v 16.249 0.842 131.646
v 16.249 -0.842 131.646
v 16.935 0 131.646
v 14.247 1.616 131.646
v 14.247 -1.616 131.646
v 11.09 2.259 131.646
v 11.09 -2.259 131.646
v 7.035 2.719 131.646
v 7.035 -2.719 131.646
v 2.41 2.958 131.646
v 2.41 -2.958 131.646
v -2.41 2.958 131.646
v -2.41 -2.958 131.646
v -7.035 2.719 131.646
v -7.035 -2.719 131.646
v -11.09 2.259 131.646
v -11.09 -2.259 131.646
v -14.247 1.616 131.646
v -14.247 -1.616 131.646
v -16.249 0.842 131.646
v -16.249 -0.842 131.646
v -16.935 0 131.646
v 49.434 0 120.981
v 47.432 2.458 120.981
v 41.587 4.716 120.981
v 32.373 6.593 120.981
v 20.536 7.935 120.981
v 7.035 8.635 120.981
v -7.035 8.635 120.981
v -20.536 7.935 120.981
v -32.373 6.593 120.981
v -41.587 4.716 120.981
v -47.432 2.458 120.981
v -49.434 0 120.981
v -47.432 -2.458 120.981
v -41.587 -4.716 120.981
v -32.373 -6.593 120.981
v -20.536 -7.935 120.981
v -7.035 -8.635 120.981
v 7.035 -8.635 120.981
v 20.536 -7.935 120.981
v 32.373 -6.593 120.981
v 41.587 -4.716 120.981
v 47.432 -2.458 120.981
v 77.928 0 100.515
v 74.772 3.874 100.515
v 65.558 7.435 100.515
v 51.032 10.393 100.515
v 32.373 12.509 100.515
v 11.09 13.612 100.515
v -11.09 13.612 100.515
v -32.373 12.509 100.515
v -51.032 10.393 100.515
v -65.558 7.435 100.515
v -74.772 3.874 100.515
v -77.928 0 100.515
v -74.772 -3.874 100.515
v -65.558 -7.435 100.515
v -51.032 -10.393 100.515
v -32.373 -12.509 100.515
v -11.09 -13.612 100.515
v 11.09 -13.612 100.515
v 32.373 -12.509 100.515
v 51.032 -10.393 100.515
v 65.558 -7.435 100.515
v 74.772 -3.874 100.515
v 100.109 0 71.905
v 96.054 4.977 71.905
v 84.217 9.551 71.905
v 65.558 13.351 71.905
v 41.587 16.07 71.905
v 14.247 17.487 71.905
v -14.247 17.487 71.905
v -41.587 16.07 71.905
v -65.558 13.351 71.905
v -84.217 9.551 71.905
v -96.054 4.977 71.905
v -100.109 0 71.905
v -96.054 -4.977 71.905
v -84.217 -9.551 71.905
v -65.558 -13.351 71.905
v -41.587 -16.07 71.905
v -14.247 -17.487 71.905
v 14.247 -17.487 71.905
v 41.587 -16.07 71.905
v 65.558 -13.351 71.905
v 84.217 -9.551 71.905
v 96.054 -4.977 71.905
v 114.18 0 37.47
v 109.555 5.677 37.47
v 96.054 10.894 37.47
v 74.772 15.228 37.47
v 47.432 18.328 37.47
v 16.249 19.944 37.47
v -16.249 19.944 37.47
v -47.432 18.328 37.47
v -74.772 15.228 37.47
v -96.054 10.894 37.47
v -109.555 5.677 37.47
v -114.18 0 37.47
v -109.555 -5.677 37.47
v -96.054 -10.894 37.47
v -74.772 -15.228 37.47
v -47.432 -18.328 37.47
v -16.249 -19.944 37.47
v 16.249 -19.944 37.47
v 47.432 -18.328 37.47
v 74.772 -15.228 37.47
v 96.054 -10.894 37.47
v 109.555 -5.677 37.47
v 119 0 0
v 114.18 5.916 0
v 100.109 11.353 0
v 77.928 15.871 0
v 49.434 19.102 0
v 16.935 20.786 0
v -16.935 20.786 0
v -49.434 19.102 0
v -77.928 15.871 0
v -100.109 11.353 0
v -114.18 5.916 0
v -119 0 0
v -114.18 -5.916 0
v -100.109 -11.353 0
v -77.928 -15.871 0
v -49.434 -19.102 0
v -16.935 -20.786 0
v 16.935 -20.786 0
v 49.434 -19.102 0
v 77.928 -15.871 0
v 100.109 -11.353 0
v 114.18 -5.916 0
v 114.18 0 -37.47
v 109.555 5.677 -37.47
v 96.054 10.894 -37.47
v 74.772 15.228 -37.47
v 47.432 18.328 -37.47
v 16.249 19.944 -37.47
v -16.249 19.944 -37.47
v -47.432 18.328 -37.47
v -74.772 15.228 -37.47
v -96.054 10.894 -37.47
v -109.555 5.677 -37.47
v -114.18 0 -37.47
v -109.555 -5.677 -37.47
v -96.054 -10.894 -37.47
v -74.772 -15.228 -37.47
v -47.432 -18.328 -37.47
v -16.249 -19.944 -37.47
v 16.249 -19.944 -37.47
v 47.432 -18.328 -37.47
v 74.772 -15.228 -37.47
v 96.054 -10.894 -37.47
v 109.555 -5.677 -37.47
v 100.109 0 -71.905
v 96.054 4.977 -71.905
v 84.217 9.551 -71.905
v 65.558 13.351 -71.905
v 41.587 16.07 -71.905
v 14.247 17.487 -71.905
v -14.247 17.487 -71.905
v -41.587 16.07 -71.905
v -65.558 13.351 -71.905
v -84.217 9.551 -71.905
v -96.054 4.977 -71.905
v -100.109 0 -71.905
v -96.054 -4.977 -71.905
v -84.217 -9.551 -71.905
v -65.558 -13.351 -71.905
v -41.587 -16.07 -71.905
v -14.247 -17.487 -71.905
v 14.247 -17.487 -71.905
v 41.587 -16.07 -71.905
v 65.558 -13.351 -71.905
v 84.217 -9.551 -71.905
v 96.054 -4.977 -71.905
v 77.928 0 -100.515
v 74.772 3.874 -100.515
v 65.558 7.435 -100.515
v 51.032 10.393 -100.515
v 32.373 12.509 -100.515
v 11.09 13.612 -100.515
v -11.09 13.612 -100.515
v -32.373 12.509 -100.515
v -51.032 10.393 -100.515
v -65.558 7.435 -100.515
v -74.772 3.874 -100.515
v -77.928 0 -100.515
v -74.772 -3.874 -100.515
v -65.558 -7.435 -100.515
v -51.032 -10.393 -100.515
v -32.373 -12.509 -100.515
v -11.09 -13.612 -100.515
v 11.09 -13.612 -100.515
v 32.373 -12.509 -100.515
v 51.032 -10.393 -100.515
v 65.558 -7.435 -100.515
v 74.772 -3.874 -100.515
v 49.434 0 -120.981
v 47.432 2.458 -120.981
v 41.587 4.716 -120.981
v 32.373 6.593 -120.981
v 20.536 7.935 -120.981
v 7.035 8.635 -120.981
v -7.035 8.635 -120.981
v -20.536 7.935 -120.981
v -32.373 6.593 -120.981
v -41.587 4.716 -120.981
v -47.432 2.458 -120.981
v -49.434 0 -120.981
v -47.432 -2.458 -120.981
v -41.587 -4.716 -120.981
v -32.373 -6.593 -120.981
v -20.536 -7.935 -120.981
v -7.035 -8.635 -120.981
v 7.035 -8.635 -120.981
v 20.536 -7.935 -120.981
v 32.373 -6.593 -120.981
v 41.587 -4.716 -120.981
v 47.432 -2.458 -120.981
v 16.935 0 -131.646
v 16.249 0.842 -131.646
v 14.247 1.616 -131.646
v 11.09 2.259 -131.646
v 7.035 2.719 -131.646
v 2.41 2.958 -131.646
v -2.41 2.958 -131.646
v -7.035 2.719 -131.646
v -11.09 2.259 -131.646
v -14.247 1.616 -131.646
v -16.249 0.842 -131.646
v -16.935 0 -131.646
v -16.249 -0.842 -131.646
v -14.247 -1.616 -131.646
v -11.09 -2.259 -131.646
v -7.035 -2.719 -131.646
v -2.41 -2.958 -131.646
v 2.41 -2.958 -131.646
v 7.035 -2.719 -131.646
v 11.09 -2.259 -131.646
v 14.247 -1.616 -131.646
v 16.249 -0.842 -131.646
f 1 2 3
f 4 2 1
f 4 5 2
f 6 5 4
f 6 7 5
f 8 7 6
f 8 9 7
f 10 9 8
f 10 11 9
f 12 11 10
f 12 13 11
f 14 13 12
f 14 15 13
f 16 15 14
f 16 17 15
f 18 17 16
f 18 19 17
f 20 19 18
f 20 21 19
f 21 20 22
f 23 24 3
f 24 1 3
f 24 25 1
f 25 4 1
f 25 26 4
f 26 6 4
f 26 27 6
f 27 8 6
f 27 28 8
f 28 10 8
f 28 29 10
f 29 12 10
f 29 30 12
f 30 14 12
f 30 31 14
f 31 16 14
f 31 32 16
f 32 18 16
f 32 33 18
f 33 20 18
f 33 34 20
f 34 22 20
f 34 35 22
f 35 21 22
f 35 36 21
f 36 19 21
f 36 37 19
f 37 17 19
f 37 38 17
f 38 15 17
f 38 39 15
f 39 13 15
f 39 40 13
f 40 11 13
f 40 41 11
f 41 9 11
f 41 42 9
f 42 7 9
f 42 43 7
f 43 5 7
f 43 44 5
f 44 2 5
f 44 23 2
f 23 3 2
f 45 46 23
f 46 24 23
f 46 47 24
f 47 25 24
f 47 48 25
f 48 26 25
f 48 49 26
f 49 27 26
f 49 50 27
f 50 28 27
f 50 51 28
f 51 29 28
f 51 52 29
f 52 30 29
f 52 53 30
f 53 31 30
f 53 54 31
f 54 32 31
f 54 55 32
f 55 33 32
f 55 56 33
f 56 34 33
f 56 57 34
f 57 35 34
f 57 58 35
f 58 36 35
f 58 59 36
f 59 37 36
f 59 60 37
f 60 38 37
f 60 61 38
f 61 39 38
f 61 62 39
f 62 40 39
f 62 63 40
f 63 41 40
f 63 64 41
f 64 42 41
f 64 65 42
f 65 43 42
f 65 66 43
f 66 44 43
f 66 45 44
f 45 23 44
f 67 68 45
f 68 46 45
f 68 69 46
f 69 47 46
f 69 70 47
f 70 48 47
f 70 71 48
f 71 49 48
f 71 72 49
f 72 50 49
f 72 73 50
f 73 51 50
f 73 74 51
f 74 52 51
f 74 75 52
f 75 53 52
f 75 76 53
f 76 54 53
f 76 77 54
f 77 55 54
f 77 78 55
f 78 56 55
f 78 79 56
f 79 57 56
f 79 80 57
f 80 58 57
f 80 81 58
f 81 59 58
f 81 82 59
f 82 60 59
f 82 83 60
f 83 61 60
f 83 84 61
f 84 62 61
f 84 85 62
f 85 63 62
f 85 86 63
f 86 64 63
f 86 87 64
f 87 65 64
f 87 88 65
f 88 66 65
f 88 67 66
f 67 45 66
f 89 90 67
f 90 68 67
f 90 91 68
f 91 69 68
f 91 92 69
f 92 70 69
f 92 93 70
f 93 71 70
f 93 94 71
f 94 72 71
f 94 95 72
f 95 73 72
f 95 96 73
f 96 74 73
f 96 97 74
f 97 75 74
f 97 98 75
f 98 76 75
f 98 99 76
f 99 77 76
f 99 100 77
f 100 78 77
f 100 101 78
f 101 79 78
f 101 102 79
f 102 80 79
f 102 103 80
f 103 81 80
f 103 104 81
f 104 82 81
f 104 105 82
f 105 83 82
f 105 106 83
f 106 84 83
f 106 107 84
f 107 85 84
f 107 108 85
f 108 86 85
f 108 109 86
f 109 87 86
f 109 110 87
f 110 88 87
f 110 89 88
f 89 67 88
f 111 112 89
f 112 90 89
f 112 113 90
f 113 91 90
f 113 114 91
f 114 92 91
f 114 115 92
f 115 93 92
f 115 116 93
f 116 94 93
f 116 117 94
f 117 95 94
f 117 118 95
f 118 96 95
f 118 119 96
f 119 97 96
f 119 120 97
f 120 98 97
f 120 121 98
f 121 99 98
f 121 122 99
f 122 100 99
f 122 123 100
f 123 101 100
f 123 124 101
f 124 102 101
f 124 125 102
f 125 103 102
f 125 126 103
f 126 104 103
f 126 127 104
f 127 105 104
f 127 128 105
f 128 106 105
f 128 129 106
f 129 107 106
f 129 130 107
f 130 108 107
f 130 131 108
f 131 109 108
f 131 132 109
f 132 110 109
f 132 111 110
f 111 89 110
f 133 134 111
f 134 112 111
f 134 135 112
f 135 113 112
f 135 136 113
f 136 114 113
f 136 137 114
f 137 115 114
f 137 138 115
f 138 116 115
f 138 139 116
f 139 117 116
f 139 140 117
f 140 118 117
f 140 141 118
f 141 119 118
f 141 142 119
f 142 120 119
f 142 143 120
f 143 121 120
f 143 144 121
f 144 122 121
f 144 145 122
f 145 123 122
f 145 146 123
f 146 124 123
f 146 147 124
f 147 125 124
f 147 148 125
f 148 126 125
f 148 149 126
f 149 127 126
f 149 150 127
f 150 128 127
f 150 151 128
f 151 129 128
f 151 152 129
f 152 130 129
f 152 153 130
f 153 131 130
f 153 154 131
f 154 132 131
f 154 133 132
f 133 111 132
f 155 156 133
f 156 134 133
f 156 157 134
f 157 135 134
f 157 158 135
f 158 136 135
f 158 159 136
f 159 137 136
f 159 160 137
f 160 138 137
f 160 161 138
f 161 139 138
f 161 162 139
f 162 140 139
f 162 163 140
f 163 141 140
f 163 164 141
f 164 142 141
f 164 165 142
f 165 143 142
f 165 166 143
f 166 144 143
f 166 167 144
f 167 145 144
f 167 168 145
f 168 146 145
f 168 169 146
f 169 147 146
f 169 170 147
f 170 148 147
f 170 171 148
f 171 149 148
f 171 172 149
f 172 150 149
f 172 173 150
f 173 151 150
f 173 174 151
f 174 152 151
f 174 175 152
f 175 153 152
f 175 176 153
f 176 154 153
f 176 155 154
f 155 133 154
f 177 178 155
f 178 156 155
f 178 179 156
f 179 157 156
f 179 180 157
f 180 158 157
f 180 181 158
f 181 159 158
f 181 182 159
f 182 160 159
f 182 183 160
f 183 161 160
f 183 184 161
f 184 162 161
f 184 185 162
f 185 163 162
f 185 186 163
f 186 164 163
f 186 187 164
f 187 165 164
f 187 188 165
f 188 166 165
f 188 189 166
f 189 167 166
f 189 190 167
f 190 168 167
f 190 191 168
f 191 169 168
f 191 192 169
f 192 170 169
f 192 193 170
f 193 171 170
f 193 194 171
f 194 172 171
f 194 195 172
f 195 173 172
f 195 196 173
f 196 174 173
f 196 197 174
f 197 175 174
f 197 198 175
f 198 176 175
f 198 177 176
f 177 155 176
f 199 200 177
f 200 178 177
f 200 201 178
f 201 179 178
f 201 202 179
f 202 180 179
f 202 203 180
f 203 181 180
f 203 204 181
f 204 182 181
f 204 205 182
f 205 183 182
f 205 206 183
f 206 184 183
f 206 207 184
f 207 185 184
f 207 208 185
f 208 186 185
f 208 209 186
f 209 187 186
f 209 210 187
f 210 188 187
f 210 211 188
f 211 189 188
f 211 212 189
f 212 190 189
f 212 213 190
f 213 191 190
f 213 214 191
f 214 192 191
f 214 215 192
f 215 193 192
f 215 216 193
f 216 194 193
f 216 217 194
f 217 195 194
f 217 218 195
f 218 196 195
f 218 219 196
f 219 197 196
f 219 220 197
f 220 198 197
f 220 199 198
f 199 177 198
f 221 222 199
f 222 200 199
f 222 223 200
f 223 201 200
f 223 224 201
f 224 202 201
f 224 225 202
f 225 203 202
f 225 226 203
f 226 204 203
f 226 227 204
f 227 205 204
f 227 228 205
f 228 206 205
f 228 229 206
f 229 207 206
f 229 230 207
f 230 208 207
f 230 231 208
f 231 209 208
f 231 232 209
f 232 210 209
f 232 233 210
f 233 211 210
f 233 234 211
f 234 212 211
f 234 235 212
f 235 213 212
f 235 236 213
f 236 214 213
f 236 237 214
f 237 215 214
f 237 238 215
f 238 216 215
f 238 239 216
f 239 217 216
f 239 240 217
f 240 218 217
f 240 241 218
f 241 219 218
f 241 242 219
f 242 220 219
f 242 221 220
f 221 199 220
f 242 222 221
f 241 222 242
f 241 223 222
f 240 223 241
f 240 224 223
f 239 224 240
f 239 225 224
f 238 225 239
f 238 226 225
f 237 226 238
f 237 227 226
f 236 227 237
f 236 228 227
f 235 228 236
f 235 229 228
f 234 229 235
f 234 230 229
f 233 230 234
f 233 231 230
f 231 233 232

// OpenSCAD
// Generated by SolidPython 1.0.1 on 2020-07-29 00:46:52


scale(v = [17, 3, 19]) {
	sphere(r = 7);
}
/***********************************************
*********      SolidPython code:      **********
************************************************
 
# import packages: SolidPython
from solid import *
from solid.utils import *
from itertools import chain, combinations, permutations


class Resize:

    def __init__(self, scad_file):
        self.scad_file = scad_file
        #self.scad_file = import_scad(scad_file)
        # cone/cylinder param:
        self.r1 = 0
        self.r2 = 0
        self.h = 0
        # rectangular prism param:
        self.w = 0
        self.l = 0
        # ellipse param:
        self.r = 0

    # import OpenScad code (file name corresponds to shape)


    # classify shape + parameters
    def assign(self, param1, param2, param3):
        if self.scad_file == 'cone.scad':
            self.r1 = param1
            self.r2 = param2
            self.h = param3
        elif self.scad_file == 'cylinder.scad':
            self.r1 = param1
            self.r2 = param2
            self.h = param3
        elif self.scad_file == 'rectangularPrism.scad':
            self.h = param1
            self.l = param2
            self.w = param3
        else:
            self.r = param1
            self.h = param2

    # resize parameters
    def iterate(self):
        x = range(3, 20, 2)
        i = 1
        if self.scad_file == 'cone.scad':
            tempList = list(permutations(x, 2))
            for temp in tempList:
                param1 = temp[0]
                param2 = temp[1]
                filepath = 'produced_scad_files/' + 'cone' + str(param1) + '_' + str(param2) + '_' + '.scad'
                scad_render_to_file(cylinder(h=param1, r1=param2, r2=0), filepath)

        elif self.scad_file == 'cylinder.scad':
            tempList = list(permutations(x, 3))
            for temp in tempList:
                param1 = temp[0]
                param2 = temp[1]
                filepath = 'produced_scad_files/' + 'cylinder' + str(param1) + '_' + str(param2) + '_' + '.scad'
                scad_render_to_file(cylinder(h=param1, r1=param2, r2=param2), filepath)

        elif self.scad_file == 'rectangularPrism.scad':
            tempList = list(permutations(x, 3))
            for temp in tempList:
                param1 = temp[0]
                param2 = temp[1]
                param3 = temp[2]
                filepath = 'produced_scad_files/' + 'rectangularPrism' + str(param1) + '_' + str(param2) + '_' + str(
                    param3) + '.scad'
                scad_render_to_file(cube(size=(param1, param2, param3)), filepath)

        elif self.scad_file == 'ellipse.scad':
            tempList = list(permutations(x, 4))
            for temp in tempList:
                param1 = temp[0]
                param2 = temp[1]
                param3 = temp[2]
                param4 = temp[3]
                filepath = 'produced_scad_files/' + 'ellipse' + str(param1) + '_' + str(param2) + '_' + str(param3) + '_' + str(param4) + '.scad'
                scad_render_to_file(scale([param1, param2, param3])(sphere(r=param4)), filepath)

    def render_to_scadfile(self):
        scad_render_to_file(scad, 'example.scad') 
 
************************************************/
